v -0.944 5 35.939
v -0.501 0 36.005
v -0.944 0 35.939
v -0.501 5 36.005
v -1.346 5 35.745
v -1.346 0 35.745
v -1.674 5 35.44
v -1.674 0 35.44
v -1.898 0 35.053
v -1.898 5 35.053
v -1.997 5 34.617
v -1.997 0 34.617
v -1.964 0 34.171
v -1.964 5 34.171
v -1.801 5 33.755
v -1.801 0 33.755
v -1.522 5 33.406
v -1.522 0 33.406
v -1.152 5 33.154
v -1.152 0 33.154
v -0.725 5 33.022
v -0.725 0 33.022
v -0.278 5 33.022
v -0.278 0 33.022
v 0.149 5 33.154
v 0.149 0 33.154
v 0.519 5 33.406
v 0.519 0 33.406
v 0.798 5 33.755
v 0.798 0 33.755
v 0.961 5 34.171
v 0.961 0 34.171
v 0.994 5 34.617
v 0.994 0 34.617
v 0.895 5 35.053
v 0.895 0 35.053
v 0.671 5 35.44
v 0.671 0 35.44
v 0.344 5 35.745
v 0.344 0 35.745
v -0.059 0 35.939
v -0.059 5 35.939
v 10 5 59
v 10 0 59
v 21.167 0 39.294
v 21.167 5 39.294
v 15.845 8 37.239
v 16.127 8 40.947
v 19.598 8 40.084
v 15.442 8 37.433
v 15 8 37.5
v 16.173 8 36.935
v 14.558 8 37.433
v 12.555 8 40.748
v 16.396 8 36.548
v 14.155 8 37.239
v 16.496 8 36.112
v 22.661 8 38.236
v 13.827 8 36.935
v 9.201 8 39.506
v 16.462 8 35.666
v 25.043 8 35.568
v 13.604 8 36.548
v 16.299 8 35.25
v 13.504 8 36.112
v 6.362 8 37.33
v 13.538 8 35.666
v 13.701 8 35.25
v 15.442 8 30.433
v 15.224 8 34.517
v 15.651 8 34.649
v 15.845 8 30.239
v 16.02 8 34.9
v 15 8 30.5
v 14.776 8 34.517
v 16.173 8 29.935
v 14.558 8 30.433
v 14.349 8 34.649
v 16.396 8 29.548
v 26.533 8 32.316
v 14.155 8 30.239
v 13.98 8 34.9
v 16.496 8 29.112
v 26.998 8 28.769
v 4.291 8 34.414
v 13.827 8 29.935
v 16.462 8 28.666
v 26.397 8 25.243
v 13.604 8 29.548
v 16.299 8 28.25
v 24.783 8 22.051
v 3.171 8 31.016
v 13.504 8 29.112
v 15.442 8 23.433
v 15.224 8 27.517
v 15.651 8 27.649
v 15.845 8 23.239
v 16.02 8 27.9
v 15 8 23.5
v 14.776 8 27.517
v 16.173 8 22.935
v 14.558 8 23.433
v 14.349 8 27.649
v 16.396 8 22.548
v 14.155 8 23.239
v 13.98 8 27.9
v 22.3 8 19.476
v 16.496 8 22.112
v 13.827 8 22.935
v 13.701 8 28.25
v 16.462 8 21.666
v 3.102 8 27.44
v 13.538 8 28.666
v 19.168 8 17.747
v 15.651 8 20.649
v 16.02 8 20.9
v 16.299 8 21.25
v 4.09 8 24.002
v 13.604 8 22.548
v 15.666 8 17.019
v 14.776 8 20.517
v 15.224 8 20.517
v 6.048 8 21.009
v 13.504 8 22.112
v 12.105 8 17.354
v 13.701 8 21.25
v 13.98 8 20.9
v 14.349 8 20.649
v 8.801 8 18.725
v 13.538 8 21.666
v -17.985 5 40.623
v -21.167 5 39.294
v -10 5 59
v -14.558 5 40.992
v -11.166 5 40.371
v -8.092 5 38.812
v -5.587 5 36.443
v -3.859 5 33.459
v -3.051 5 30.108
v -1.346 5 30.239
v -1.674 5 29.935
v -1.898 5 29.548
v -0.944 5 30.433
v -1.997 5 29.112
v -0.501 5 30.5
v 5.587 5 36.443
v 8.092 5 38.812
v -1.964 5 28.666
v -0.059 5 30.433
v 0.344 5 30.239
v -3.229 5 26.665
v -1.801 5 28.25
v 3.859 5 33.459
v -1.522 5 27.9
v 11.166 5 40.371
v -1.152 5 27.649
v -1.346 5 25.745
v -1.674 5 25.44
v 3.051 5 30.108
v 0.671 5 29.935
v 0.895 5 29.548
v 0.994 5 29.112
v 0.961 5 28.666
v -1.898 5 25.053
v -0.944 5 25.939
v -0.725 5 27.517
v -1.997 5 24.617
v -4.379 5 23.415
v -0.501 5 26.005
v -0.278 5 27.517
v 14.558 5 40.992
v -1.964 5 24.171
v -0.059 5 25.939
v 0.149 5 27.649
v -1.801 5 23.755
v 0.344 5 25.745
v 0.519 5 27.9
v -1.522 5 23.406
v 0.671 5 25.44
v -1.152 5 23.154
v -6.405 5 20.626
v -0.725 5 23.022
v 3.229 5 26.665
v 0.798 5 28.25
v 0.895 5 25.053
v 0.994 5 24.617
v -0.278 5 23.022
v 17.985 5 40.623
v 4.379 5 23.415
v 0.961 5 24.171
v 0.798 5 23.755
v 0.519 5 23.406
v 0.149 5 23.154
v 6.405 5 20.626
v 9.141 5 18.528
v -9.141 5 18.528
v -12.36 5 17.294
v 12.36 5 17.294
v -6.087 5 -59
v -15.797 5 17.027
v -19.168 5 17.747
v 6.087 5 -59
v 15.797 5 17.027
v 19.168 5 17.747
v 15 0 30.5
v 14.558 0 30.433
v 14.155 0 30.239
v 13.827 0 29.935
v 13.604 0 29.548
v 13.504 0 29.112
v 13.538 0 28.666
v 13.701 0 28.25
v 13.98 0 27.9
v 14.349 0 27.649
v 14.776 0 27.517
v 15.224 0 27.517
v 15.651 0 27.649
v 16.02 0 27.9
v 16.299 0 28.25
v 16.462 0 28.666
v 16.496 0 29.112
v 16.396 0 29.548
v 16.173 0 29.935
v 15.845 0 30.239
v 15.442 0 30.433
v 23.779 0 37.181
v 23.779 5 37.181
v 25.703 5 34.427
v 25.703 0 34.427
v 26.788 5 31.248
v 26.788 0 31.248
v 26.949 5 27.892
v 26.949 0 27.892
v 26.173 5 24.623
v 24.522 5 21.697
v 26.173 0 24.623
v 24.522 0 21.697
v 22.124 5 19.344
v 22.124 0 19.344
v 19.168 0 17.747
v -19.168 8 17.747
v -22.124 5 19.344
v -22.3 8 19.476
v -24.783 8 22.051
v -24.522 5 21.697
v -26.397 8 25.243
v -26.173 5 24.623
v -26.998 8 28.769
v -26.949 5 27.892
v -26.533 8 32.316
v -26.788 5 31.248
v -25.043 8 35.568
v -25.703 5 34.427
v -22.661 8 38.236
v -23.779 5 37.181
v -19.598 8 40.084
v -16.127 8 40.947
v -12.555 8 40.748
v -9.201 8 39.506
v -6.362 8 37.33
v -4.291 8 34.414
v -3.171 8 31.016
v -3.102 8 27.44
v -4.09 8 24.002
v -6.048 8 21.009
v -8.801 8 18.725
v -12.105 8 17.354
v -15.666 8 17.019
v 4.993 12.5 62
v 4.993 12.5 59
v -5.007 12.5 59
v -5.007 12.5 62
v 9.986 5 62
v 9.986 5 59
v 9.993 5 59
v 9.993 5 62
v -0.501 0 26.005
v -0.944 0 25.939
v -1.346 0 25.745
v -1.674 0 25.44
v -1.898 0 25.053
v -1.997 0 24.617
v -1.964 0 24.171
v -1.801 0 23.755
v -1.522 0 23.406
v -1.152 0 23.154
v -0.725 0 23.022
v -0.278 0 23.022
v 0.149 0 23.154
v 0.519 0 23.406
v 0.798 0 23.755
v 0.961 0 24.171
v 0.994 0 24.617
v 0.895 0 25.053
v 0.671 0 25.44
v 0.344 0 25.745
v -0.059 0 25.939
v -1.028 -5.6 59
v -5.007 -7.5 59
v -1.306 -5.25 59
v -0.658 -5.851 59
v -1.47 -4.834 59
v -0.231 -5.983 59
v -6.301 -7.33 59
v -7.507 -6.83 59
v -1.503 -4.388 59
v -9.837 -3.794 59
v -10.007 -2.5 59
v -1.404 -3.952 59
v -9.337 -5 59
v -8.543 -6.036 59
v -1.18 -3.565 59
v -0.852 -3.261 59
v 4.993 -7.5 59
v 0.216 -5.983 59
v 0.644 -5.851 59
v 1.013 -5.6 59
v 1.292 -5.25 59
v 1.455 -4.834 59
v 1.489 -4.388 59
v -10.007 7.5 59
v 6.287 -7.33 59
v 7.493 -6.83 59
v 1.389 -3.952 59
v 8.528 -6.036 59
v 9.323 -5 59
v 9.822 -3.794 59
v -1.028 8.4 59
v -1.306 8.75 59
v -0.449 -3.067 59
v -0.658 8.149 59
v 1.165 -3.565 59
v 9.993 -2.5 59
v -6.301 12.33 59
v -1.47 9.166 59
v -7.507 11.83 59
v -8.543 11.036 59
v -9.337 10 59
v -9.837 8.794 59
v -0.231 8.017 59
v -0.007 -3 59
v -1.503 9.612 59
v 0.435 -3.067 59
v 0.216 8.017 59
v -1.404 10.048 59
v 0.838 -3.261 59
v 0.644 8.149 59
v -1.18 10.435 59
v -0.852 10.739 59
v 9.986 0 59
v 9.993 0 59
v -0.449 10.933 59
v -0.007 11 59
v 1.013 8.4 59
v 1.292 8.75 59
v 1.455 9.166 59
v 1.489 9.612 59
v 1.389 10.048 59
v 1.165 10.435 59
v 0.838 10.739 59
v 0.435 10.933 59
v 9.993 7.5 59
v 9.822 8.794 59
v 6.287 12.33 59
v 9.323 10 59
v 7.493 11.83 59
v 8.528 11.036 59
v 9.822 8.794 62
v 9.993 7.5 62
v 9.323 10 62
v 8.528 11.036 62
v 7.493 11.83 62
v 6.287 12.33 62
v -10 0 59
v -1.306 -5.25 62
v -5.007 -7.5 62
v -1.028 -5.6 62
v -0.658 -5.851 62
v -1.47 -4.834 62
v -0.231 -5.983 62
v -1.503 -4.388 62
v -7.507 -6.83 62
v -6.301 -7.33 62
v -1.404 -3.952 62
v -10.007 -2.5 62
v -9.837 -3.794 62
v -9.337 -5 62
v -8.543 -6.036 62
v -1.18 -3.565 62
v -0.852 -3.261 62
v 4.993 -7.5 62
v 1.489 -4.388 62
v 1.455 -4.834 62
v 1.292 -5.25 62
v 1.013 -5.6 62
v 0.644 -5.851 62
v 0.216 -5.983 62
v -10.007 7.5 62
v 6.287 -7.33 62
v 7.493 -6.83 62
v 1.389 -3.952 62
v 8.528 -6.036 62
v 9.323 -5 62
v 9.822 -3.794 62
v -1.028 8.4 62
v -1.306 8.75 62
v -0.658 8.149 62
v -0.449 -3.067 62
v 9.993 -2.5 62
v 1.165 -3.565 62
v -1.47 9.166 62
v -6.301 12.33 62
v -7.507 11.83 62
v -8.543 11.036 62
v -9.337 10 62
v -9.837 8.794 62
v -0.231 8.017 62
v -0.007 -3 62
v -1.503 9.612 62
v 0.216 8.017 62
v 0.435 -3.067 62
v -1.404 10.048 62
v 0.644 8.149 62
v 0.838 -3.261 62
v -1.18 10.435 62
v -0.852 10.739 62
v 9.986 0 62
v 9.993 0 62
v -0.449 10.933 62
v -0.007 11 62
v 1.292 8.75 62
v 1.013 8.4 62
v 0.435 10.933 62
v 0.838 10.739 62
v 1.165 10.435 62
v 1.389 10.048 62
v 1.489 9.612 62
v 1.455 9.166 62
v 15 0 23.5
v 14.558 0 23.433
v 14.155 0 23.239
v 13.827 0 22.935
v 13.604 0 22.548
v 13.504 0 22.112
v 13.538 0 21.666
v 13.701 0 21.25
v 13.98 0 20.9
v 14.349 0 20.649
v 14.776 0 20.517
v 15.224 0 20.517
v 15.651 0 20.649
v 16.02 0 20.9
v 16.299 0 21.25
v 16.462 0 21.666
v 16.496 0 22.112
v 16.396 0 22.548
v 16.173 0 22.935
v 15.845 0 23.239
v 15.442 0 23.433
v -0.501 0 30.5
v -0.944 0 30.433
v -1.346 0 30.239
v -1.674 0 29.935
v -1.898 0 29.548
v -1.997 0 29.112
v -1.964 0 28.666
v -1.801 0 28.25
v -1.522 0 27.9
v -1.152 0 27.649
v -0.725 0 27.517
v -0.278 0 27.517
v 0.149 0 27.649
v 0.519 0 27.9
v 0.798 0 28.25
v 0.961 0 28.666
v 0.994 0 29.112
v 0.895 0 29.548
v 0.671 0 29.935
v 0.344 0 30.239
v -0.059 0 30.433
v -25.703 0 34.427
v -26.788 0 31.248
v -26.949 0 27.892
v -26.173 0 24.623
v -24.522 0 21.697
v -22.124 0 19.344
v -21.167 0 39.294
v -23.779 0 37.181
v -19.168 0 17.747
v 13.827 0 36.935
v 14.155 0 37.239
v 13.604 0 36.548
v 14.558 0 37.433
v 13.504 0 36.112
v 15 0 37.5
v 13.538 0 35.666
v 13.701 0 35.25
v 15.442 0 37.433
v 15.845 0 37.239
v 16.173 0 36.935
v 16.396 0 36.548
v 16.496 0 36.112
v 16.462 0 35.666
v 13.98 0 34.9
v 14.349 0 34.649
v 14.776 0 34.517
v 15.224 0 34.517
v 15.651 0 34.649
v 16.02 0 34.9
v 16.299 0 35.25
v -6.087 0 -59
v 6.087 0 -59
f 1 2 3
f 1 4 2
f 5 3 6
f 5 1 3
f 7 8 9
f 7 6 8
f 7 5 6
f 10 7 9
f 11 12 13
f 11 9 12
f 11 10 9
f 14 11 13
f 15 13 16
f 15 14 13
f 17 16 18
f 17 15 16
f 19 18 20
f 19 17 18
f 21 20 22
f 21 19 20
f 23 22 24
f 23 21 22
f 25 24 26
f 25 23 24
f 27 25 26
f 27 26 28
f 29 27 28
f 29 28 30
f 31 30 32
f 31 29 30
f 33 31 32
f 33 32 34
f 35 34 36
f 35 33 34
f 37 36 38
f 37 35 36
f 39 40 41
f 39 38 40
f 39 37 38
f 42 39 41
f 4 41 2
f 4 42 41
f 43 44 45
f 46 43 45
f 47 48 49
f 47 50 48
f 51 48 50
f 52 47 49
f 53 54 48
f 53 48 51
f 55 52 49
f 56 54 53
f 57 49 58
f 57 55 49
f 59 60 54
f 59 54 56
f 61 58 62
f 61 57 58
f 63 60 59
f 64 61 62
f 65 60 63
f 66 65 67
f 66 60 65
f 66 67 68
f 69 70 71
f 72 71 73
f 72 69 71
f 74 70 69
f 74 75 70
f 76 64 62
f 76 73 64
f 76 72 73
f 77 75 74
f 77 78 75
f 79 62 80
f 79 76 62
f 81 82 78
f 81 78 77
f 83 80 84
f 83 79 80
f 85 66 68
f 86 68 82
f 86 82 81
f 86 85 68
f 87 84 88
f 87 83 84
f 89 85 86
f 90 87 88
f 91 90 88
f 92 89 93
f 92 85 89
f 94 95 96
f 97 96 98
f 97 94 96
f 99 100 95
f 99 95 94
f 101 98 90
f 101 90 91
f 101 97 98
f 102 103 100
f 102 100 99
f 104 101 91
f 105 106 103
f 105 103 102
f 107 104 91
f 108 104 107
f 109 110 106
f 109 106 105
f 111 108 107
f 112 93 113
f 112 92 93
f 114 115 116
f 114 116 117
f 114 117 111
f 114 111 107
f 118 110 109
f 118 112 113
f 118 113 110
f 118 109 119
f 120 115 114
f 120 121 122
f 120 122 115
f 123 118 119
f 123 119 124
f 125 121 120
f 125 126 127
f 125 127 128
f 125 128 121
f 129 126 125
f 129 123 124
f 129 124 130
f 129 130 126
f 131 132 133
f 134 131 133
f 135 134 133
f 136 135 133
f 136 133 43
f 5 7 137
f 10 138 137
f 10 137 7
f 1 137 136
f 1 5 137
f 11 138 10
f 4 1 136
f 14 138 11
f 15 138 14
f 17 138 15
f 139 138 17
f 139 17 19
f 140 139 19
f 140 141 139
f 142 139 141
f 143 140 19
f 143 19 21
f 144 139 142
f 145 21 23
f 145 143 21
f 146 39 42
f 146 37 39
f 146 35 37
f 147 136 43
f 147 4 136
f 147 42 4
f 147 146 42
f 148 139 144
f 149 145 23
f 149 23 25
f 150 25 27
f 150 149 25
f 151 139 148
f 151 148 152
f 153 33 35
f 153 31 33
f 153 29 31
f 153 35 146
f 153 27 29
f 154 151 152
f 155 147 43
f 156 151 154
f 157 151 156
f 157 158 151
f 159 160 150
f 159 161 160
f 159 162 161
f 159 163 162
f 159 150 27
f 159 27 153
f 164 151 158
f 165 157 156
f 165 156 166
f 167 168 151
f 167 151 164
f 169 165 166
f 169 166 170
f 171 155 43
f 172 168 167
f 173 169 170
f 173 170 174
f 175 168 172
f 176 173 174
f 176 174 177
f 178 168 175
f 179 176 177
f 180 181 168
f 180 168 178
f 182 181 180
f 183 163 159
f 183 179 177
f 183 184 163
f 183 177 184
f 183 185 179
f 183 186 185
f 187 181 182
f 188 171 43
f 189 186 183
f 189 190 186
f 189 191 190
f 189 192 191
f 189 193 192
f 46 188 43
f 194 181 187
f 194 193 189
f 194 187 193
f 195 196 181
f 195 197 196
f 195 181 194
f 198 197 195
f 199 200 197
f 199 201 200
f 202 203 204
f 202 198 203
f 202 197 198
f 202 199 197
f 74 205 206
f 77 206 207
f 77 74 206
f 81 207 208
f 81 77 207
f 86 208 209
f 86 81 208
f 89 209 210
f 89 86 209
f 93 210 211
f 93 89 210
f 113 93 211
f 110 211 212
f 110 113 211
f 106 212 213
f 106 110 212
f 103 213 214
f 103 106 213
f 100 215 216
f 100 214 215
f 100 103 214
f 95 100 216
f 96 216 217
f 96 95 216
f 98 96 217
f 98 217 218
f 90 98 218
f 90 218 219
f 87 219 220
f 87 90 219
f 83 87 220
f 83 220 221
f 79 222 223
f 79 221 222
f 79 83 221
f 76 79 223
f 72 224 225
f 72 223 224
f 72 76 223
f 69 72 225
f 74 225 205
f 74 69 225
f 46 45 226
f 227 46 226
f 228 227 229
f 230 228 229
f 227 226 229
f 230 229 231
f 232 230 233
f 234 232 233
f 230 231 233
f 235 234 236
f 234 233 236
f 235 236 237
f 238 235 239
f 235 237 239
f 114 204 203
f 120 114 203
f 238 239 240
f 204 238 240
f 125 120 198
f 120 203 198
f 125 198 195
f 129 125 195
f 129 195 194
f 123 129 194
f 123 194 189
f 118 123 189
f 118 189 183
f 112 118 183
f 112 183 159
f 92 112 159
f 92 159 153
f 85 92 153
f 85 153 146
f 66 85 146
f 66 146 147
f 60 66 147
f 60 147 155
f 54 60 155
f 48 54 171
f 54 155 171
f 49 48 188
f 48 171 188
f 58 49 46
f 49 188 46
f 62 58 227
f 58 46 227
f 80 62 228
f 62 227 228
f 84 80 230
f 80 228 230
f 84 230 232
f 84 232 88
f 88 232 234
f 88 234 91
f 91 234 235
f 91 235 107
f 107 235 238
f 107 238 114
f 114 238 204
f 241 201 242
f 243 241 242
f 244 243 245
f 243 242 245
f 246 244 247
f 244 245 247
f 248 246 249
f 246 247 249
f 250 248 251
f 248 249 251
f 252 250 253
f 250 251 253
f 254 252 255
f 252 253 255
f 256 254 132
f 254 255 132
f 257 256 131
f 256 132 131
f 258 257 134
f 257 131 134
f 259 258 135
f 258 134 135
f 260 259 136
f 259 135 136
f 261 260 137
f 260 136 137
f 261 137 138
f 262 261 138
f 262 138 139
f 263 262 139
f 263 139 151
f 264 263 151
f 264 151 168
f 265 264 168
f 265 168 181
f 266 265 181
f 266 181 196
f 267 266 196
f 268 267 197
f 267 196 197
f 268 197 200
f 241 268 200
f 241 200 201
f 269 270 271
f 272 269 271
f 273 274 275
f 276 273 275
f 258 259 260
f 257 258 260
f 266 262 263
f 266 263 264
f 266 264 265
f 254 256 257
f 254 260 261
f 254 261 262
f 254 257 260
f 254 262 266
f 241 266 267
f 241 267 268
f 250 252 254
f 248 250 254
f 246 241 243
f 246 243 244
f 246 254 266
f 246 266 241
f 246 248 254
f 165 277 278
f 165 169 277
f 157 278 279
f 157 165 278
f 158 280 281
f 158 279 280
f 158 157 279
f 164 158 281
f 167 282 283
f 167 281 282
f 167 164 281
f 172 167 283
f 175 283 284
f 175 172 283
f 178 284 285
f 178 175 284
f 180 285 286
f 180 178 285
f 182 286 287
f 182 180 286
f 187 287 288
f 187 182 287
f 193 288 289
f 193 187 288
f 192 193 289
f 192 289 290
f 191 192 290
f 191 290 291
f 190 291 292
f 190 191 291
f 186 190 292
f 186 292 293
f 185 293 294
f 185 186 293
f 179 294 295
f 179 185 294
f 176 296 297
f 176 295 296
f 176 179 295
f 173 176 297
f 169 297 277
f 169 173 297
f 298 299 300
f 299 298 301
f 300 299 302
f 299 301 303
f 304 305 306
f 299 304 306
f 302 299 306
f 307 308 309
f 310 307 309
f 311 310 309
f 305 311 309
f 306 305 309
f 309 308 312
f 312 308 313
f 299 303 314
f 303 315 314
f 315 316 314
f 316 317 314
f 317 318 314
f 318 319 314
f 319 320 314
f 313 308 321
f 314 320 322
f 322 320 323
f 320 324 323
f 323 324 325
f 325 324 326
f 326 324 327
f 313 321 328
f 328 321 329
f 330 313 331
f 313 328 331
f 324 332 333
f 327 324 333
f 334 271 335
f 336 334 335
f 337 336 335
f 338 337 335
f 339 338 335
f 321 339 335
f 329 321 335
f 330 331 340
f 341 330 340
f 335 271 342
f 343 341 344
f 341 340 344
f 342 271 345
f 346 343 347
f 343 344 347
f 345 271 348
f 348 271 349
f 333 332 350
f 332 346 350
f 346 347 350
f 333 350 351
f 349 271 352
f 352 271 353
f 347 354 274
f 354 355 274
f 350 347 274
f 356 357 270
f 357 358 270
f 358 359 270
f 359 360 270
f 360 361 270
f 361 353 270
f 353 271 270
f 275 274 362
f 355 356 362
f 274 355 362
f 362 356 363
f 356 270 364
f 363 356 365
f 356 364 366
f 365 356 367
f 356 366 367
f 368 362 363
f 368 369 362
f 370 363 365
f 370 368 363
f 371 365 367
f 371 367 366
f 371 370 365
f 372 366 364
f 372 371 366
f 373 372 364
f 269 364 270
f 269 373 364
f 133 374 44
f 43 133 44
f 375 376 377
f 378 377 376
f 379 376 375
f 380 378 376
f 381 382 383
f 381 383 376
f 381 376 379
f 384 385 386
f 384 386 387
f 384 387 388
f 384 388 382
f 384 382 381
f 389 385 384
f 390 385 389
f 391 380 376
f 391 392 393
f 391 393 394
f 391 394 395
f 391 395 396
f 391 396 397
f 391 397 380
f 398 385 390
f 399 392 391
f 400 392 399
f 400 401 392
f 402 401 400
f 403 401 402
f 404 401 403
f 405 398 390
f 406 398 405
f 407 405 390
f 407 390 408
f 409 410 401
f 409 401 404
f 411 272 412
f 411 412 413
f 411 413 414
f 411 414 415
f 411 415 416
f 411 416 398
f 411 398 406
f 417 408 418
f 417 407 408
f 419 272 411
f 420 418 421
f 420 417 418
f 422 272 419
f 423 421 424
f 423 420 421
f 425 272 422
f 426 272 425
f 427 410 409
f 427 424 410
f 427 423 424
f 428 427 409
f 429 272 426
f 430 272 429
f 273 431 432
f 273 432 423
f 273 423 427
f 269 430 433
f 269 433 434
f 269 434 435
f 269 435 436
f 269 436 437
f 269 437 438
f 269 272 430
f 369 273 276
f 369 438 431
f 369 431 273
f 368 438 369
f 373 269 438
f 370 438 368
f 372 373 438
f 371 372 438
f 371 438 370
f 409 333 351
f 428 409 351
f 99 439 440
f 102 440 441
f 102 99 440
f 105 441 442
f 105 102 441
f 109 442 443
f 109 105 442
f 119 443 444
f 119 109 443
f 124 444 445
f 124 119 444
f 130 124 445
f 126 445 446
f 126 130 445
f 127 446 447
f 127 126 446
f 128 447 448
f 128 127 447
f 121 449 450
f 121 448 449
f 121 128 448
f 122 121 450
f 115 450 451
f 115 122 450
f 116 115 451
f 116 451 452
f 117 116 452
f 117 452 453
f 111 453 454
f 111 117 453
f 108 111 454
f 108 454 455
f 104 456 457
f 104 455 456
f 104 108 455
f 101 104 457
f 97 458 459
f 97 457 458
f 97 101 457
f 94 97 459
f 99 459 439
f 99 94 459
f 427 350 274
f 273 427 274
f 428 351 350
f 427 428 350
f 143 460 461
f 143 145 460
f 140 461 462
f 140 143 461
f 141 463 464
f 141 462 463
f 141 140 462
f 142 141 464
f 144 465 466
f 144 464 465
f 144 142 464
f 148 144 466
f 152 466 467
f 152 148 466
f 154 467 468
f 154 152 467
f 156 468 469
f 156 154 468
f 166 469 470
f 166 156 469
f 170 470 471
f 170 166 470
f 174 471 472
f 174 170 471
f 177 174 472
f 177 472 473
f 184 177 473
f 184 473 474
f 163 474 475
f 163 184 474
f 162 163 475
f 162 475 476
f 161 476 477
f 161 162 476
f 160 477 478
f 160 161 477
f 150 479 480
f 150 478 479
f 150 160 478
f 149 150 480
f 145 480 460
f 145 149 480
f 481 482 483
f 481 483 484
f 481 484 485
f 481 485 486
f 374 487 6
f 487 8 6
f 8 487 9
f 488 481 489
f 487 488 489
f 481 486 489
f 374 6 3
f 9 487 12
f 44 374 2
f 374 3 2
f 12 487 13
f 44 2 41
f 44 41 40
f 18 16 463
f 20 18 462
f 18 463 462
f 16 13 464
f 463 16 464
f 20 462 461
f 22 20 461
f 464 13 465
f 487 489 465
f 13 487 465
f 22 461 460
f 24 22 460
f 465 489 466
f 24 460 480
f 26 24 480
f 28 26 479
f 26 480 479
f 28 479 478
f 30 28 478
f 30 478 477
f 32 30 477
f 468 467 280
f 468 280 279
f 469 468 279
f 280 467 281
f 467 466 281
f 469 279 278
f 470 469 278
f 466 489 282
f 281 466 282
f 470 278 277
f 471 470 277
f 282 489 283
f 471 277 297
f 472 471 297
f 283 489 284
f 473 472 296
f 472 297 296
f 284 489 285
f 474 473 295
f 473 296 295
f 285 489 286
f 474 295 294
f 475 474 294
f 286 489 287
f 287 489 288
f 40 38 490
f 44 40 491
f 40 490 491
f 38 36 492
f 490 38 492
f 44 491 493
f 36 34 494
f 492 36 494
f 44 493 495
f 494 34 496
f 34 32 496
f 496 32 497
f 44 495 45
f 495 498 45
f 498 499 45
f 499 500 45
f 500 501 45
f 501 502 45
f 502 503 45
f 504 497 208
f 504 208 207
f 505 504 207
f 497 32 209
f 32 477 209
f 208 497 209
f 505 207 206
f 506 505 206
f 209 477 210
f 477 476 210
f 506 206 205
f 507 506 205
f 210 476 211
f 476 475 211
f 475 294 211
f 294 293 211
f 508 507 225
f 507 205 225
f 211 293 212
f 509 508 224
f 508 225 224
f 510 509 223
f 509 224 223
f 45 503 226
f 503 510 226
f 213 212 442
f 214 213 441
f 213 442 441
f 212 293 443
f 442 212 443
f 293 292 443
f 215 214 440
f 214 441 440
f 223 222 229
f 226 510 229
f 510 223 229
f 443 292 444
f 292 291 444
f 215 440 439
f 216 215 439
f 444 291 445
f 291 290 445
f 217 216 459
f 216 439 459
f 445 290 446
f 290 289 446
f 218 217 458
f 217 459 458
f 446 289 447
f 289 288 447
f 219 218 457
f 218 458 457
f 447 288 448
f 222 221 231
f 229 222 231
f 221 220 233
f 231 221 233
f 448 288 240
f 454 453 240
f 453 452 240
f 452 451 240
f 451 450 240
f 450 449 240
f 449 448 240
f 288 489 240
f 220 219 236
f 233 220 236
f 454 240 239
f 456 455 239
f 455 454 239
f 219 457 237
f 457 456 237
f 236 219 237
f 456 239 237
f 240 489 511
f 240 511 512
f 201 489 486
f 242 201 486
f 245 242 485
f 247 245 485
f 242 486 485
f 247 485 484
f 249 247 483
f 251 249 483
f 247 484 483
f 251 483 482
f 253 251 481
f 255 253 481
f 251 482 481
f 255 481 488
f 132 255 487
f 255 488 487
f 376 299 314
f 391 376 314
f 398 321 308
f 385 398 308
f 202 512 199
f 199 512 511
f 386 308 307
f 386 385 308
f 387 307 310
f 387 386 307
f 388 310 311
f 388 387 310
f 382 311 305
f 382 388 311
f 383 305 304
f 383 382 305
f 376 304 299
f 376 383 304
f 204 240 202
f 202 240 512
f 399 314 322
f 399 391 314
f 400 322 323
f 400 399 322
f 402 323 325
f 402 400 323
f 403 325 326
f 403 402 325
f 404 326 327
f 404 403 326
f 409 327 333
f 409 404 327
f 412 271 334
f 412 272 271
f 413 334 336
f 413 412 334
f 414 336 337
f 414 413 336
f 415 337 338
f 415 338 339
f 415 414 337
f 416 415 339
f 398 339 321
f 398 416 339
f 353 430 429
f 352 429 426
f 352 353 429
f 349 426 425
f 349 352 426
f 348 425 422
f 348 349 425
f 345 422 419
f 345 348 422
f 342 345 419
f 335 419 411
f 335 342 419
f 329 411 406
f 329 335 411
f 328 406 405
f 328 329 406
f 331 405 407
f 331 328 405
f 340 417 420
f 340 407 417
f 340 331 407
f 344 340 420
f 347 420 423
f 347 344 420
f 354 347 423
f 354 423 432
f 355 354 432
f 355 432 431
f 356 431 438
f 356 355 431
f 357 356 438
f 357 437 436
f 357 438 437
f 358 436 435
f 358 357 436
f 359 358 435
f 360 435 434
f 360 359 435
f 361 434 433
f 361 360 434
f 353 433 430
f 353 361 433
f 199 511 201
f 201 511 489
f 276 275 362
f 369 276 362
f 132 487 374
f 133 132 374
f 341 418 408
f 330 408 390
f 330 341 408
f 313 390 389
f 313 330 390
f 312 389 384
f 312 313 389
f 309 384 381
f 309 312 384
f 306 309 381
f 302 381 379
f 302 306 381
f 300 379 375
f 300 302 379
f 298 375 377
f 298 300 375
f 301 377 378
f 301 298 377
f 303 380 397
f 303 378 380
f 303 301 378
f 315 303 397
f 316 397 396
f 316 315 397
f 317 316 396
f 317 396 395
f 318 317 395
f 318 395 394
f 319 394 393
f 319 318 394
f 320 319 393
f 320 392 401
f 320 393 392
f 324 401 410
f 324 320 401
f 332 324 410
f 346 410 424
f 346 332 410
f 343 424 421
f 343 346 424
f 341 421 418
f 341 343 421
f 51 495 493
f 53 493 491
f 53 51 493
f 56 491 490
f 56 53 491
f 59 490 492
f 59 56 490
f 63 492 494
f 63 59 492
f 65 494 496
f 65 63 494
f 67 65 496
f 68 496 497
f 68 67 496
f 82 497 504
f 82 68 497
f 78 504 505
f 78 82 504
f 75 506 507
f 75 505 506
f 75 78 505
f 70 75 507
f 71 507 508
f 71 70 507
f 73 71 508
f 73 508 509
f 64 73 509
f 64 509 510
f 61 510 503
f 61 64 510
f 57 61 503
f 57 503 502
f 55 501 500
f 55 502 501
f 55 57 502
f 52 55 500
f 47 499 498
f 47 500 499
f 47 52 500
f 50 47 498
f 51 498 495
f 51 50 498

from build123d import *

# Parameters (mm, degrees)
SKETCH1_R                      = 12
SKETCH1_W                      = 20
SKETCH1_H                      = 15
BOSS_EXTRUDE1_DEPTH            = 5
SKETCH2_R                      = 12
BOSS_EXTRUDE2_DEPTH            = 3
SKETCH3_W                      = 19.985503564
SKETCH3_H                      = 5
BOSS_EXTRUDE12_DEPTH           = 3
FILLET1_R                      = 5
F_3_0MM_DOWEL_HOLE1_AT_2_COUNT = 2
F_3_0MM_DOWEL_HOLE1_AT_2_PITCH = 14
F_3_0MM_DOWEL_HOLE2_AT_2_COUNT = 2
F_3_0MM_DOWEL_HOLE2_AT_2_PITCH = 7
F_3_0MM_DOWEL_HOLE2_AT_3_COUNT = 2
F_3_0MM_DOWEL_HOLE2_AT_3_PITCH = 7
F_3_0MM_DOWEL_HOLE2_AT_4_COUNT = 2
F_3_0MM_DOWEL_HOLE2_AT_4_PITCH = 15.501479882
F_3_0MM_DOWEL_HOLE2_AT_5_COUNT = 2
F_3_0MM_DOWEL_HOLE2_AT_5_PITCH = 16.45
F_3_0MM_DOWEL_HOLE2_AT_6_COUNT = 2
F_3_0MM_DOWEL_HOLE2_AT_6_PITCH = 16.14


with BuildPart() as part:
    # Sketch1 → Boss-Extrude1 (new body)
    with BuildSketch(Plane(origin=(0, 0, 0), x_dir=(1, 0, 0), z_dir=(0, 1, 0))):
        with BuildLine():
            Line((-6.086540156, 59), (-19.168461188, -17.74727005))
            ThreePointArc((-19.168461188, -17.74727005), (-12.983628308, -17.170619408), (-7.339080595, -19.763641742))
            Line((-7.339080595, -19.763641742), (0, 23.29229775))
            Line((0, 23.29229775), (7.339080595, -19.763641742))
            ThreePointArc((7.339080595, -19.763641742), (12.983628308, -17.170619408), (19.168461188, -17.74727005))
            Line((19.168461188, -17.74727005), (6.086540156, 59))
            Line((6.086540156, 59), (-6.086540156, 59))
        make_face()
        with BuildLine():
            Line((-10, -59), (-10, -44))
            Line((-10, -44), (10, -44))
            Line((10, -44), (10, -59))
            Line((10, -59), (21.166526493, -39.294365013))
            ThreePointArc((21.166526493, -39.294365013), (5.206094221, -35.933931755), (7.339080595, -19.763641742))
            Line((7.339080595, -19.763641742), (0, 23.29229775))
            Line((0, 23.29229775), (-7.339080595, -19.763641742))
            ThreePointArc((-7.339080595, -19.763641742), (-4.13880686, -23.897600215), (-3, -29))
            ThreePointArc((-3, -29), (-9.083849136, -39.44026623), (-21.166526493, -39.294365013))
            Line((-21.166526493, -39.294365013), (-10, -59))
        make_face()
        with Locations((15, -29)):
            Circle(SKETCH1_R)
        with Locations((-15, -29)):
            Circle(SKETCH1_R)
        with Locations((0, -51.5)):
            Rectangle(SKETCH1_W, SKETCH1_H)
    extrude(amount=BOSS_EXTRUDE1_DEPTH)

    # Sketch2 → Boss-Extrude2 (add)
    with BuildSketch(Plane(origin=(0, 5, 0), x_dir=(1, 0, 0), z_dir=(0, 1, 0))):
        with Locations(Location((15, -29, 0), (0, 0, 69.673355432))):
            Circle(SKETCH2_R)
        with Locations(Location((-15, -29, 0), (0, 0, 110.326644568))):
            Circle(SKETCH2_R)
    extrude(amount=BOSS_EXTRUDE2_DEPTH)

    # Sketch9 → Ø3.0mm Dowel Hole2 (revolve, cut)
    with BuildSketch(Plane(origin=(15, 8, 29), x_dir=(0, 0, 1), z_dir=(1, 0, 0))):
        Polygon((0, 0), (0, 29.901290929), (1.5, 29), (1.5, 0), align=None)
    f_3_0mm_dowel_hole2 = revolve(axis=Axis((15, 14.35, 29), (0, -1, 0)), mode=Mode.SUBTRACT)

    # Ø3.0mm Dowel Hole2 at 2: Ø3.0mm Dowel Hole2 ×2
    with Locations(*[(0, 0, -i * F_3_0MM_DOWEL_HOLE2_AT_2_PITCH) for i in range(1, F_3_0MM_DOWEL_HOLE2_AT_2_COUNT)]):
        add(f_3_0mm_dowel_hole2, mode=Mode.SUBTRACT)

    # Ø3.0mm Dowel Hole2 at 3: Ø3.0mm Dowel Hole2 ×2
    with Locations(*[(0, 0, i * F_3_0MM_DOWEL_HOLE2_AT_3_PITCH) for i in range(1, F_3_0MM_DOWEL_HOLE2_AT_3_COUNT)]):
        add(f_3_0mm_dowel_hole2, mode=Mode.SUBTRACT)

    # Ø3.0mm Dowel Hole2 at 4: Ø3.0mm Dowel Hole2 ×2
    with Locations(*[(-i * F_3_0MM_DOWEL_HOLE2_AT_4_PITCH, 0, 0) for i in range(1, F_3_0MM_DOWEL_HOLE2_AT_4_COUNT)]):
        add(f_3_0mm_dowel_hole2, mode=Mode.SUBTRACT)

    # Ø3.0mm Dowel Hole2 at 5: Ø3.0mm Dowel Hole2 ×2
    with Locations(*[Vector(-0.9423392025471609, 0, 0.3346592705167166) * (i * F_3_0MM_DOWEL_HOLE2_AT_5_PITCH) for i in range(1, F_3_0MM_DOWEL_HOLE2_AT_5_COUNT)]):
        add(f_3_0mm_dowel_hole2, mode=Mode.SUBTRACT)

    # Ø3.0mm Dowel Hole2 at 6: Ø3.0mm Dowel Hole2 ×2
    with Locations(*[Vector(-0.9604386543928618, 0, -0.2784916356877332) * (i * F_3_0MM_DOWEL_HOLE2_AT_6_PITCH) for i in range(1, F_3_0MM_DOWEL_HOLE2_AT_6_COUNT)]):
        add(f_3_0mm_dowel_hole2, mode=Mode.SUBTRACT)


with BuildPart() as body_2:
    # Sketch3 → Boss-Extrude12 (new body)
    with BuildSketch(Plane.XY.offset(59)):
        Polygon((-10, 0), (-10, 5), (9.985503564, 5), (9.992751782, 5), (9.992751782, 12.5), (-10.007248218, 12.5), (-10.007248218, -7.5), (9.992751782, -7.5), (9.992751782, 0), (9.985503564, 0), align=None)
        with Locations((-0.007248218, 2.5)):
            Rectangle(SKETCH3_W, SKETCH3_H)
    extrude(amount=BOSS_EXTRUDE12_DEPTH)

    # Fillet1
    fillet1_edges = [body_2.edges().sort_by_distance(p)[0] for p in [
        (9.992751782, -7.5, 60.5),
        (-10.007248218, -7.5, 60.5),
        (-10.007248218, 12.5, 60.5),
        (9.992751782, 12.5, 60.5),
    ]]
    fillet(fillet1_edges, radius=FILLET1_R)

    # Sketch7 → Ø3.0mm Dowel Hole1 (revolve, cut)
    with BuildSketch(Plane(origin=(-0.007248218, 9.5, 59), x_dir=(0, 1, 0), z_dir=(1, 0, 0))):
        Polygon((0, 0), (0, 29.901290929), (1.5, 29), (1.5, 0), align=None)
    f_3_0mm_dowel_hole1 = revolve(axis=Axis((-0.007248218, 9.5, 52.65), (0, 0, 1)), mode=Mode.SUBTRACT)

    # Ø3.0mm Dowel Hole1 at 2: Ø3.0mm Dowel Hole1 ×2
    with Locations(*[(0, -i * F_3_0MM_DOWEL_HOLE1_AT_2_PITCH, 0) for i in range(1, F_3_0MM_DOWEL_HOLE1_AT_2_COUNT)]):
        add(f_3_0mm_dowel_hole1, mode=Mode.SUBTRACT)


solid = Compound([part.part, body_2.part])
